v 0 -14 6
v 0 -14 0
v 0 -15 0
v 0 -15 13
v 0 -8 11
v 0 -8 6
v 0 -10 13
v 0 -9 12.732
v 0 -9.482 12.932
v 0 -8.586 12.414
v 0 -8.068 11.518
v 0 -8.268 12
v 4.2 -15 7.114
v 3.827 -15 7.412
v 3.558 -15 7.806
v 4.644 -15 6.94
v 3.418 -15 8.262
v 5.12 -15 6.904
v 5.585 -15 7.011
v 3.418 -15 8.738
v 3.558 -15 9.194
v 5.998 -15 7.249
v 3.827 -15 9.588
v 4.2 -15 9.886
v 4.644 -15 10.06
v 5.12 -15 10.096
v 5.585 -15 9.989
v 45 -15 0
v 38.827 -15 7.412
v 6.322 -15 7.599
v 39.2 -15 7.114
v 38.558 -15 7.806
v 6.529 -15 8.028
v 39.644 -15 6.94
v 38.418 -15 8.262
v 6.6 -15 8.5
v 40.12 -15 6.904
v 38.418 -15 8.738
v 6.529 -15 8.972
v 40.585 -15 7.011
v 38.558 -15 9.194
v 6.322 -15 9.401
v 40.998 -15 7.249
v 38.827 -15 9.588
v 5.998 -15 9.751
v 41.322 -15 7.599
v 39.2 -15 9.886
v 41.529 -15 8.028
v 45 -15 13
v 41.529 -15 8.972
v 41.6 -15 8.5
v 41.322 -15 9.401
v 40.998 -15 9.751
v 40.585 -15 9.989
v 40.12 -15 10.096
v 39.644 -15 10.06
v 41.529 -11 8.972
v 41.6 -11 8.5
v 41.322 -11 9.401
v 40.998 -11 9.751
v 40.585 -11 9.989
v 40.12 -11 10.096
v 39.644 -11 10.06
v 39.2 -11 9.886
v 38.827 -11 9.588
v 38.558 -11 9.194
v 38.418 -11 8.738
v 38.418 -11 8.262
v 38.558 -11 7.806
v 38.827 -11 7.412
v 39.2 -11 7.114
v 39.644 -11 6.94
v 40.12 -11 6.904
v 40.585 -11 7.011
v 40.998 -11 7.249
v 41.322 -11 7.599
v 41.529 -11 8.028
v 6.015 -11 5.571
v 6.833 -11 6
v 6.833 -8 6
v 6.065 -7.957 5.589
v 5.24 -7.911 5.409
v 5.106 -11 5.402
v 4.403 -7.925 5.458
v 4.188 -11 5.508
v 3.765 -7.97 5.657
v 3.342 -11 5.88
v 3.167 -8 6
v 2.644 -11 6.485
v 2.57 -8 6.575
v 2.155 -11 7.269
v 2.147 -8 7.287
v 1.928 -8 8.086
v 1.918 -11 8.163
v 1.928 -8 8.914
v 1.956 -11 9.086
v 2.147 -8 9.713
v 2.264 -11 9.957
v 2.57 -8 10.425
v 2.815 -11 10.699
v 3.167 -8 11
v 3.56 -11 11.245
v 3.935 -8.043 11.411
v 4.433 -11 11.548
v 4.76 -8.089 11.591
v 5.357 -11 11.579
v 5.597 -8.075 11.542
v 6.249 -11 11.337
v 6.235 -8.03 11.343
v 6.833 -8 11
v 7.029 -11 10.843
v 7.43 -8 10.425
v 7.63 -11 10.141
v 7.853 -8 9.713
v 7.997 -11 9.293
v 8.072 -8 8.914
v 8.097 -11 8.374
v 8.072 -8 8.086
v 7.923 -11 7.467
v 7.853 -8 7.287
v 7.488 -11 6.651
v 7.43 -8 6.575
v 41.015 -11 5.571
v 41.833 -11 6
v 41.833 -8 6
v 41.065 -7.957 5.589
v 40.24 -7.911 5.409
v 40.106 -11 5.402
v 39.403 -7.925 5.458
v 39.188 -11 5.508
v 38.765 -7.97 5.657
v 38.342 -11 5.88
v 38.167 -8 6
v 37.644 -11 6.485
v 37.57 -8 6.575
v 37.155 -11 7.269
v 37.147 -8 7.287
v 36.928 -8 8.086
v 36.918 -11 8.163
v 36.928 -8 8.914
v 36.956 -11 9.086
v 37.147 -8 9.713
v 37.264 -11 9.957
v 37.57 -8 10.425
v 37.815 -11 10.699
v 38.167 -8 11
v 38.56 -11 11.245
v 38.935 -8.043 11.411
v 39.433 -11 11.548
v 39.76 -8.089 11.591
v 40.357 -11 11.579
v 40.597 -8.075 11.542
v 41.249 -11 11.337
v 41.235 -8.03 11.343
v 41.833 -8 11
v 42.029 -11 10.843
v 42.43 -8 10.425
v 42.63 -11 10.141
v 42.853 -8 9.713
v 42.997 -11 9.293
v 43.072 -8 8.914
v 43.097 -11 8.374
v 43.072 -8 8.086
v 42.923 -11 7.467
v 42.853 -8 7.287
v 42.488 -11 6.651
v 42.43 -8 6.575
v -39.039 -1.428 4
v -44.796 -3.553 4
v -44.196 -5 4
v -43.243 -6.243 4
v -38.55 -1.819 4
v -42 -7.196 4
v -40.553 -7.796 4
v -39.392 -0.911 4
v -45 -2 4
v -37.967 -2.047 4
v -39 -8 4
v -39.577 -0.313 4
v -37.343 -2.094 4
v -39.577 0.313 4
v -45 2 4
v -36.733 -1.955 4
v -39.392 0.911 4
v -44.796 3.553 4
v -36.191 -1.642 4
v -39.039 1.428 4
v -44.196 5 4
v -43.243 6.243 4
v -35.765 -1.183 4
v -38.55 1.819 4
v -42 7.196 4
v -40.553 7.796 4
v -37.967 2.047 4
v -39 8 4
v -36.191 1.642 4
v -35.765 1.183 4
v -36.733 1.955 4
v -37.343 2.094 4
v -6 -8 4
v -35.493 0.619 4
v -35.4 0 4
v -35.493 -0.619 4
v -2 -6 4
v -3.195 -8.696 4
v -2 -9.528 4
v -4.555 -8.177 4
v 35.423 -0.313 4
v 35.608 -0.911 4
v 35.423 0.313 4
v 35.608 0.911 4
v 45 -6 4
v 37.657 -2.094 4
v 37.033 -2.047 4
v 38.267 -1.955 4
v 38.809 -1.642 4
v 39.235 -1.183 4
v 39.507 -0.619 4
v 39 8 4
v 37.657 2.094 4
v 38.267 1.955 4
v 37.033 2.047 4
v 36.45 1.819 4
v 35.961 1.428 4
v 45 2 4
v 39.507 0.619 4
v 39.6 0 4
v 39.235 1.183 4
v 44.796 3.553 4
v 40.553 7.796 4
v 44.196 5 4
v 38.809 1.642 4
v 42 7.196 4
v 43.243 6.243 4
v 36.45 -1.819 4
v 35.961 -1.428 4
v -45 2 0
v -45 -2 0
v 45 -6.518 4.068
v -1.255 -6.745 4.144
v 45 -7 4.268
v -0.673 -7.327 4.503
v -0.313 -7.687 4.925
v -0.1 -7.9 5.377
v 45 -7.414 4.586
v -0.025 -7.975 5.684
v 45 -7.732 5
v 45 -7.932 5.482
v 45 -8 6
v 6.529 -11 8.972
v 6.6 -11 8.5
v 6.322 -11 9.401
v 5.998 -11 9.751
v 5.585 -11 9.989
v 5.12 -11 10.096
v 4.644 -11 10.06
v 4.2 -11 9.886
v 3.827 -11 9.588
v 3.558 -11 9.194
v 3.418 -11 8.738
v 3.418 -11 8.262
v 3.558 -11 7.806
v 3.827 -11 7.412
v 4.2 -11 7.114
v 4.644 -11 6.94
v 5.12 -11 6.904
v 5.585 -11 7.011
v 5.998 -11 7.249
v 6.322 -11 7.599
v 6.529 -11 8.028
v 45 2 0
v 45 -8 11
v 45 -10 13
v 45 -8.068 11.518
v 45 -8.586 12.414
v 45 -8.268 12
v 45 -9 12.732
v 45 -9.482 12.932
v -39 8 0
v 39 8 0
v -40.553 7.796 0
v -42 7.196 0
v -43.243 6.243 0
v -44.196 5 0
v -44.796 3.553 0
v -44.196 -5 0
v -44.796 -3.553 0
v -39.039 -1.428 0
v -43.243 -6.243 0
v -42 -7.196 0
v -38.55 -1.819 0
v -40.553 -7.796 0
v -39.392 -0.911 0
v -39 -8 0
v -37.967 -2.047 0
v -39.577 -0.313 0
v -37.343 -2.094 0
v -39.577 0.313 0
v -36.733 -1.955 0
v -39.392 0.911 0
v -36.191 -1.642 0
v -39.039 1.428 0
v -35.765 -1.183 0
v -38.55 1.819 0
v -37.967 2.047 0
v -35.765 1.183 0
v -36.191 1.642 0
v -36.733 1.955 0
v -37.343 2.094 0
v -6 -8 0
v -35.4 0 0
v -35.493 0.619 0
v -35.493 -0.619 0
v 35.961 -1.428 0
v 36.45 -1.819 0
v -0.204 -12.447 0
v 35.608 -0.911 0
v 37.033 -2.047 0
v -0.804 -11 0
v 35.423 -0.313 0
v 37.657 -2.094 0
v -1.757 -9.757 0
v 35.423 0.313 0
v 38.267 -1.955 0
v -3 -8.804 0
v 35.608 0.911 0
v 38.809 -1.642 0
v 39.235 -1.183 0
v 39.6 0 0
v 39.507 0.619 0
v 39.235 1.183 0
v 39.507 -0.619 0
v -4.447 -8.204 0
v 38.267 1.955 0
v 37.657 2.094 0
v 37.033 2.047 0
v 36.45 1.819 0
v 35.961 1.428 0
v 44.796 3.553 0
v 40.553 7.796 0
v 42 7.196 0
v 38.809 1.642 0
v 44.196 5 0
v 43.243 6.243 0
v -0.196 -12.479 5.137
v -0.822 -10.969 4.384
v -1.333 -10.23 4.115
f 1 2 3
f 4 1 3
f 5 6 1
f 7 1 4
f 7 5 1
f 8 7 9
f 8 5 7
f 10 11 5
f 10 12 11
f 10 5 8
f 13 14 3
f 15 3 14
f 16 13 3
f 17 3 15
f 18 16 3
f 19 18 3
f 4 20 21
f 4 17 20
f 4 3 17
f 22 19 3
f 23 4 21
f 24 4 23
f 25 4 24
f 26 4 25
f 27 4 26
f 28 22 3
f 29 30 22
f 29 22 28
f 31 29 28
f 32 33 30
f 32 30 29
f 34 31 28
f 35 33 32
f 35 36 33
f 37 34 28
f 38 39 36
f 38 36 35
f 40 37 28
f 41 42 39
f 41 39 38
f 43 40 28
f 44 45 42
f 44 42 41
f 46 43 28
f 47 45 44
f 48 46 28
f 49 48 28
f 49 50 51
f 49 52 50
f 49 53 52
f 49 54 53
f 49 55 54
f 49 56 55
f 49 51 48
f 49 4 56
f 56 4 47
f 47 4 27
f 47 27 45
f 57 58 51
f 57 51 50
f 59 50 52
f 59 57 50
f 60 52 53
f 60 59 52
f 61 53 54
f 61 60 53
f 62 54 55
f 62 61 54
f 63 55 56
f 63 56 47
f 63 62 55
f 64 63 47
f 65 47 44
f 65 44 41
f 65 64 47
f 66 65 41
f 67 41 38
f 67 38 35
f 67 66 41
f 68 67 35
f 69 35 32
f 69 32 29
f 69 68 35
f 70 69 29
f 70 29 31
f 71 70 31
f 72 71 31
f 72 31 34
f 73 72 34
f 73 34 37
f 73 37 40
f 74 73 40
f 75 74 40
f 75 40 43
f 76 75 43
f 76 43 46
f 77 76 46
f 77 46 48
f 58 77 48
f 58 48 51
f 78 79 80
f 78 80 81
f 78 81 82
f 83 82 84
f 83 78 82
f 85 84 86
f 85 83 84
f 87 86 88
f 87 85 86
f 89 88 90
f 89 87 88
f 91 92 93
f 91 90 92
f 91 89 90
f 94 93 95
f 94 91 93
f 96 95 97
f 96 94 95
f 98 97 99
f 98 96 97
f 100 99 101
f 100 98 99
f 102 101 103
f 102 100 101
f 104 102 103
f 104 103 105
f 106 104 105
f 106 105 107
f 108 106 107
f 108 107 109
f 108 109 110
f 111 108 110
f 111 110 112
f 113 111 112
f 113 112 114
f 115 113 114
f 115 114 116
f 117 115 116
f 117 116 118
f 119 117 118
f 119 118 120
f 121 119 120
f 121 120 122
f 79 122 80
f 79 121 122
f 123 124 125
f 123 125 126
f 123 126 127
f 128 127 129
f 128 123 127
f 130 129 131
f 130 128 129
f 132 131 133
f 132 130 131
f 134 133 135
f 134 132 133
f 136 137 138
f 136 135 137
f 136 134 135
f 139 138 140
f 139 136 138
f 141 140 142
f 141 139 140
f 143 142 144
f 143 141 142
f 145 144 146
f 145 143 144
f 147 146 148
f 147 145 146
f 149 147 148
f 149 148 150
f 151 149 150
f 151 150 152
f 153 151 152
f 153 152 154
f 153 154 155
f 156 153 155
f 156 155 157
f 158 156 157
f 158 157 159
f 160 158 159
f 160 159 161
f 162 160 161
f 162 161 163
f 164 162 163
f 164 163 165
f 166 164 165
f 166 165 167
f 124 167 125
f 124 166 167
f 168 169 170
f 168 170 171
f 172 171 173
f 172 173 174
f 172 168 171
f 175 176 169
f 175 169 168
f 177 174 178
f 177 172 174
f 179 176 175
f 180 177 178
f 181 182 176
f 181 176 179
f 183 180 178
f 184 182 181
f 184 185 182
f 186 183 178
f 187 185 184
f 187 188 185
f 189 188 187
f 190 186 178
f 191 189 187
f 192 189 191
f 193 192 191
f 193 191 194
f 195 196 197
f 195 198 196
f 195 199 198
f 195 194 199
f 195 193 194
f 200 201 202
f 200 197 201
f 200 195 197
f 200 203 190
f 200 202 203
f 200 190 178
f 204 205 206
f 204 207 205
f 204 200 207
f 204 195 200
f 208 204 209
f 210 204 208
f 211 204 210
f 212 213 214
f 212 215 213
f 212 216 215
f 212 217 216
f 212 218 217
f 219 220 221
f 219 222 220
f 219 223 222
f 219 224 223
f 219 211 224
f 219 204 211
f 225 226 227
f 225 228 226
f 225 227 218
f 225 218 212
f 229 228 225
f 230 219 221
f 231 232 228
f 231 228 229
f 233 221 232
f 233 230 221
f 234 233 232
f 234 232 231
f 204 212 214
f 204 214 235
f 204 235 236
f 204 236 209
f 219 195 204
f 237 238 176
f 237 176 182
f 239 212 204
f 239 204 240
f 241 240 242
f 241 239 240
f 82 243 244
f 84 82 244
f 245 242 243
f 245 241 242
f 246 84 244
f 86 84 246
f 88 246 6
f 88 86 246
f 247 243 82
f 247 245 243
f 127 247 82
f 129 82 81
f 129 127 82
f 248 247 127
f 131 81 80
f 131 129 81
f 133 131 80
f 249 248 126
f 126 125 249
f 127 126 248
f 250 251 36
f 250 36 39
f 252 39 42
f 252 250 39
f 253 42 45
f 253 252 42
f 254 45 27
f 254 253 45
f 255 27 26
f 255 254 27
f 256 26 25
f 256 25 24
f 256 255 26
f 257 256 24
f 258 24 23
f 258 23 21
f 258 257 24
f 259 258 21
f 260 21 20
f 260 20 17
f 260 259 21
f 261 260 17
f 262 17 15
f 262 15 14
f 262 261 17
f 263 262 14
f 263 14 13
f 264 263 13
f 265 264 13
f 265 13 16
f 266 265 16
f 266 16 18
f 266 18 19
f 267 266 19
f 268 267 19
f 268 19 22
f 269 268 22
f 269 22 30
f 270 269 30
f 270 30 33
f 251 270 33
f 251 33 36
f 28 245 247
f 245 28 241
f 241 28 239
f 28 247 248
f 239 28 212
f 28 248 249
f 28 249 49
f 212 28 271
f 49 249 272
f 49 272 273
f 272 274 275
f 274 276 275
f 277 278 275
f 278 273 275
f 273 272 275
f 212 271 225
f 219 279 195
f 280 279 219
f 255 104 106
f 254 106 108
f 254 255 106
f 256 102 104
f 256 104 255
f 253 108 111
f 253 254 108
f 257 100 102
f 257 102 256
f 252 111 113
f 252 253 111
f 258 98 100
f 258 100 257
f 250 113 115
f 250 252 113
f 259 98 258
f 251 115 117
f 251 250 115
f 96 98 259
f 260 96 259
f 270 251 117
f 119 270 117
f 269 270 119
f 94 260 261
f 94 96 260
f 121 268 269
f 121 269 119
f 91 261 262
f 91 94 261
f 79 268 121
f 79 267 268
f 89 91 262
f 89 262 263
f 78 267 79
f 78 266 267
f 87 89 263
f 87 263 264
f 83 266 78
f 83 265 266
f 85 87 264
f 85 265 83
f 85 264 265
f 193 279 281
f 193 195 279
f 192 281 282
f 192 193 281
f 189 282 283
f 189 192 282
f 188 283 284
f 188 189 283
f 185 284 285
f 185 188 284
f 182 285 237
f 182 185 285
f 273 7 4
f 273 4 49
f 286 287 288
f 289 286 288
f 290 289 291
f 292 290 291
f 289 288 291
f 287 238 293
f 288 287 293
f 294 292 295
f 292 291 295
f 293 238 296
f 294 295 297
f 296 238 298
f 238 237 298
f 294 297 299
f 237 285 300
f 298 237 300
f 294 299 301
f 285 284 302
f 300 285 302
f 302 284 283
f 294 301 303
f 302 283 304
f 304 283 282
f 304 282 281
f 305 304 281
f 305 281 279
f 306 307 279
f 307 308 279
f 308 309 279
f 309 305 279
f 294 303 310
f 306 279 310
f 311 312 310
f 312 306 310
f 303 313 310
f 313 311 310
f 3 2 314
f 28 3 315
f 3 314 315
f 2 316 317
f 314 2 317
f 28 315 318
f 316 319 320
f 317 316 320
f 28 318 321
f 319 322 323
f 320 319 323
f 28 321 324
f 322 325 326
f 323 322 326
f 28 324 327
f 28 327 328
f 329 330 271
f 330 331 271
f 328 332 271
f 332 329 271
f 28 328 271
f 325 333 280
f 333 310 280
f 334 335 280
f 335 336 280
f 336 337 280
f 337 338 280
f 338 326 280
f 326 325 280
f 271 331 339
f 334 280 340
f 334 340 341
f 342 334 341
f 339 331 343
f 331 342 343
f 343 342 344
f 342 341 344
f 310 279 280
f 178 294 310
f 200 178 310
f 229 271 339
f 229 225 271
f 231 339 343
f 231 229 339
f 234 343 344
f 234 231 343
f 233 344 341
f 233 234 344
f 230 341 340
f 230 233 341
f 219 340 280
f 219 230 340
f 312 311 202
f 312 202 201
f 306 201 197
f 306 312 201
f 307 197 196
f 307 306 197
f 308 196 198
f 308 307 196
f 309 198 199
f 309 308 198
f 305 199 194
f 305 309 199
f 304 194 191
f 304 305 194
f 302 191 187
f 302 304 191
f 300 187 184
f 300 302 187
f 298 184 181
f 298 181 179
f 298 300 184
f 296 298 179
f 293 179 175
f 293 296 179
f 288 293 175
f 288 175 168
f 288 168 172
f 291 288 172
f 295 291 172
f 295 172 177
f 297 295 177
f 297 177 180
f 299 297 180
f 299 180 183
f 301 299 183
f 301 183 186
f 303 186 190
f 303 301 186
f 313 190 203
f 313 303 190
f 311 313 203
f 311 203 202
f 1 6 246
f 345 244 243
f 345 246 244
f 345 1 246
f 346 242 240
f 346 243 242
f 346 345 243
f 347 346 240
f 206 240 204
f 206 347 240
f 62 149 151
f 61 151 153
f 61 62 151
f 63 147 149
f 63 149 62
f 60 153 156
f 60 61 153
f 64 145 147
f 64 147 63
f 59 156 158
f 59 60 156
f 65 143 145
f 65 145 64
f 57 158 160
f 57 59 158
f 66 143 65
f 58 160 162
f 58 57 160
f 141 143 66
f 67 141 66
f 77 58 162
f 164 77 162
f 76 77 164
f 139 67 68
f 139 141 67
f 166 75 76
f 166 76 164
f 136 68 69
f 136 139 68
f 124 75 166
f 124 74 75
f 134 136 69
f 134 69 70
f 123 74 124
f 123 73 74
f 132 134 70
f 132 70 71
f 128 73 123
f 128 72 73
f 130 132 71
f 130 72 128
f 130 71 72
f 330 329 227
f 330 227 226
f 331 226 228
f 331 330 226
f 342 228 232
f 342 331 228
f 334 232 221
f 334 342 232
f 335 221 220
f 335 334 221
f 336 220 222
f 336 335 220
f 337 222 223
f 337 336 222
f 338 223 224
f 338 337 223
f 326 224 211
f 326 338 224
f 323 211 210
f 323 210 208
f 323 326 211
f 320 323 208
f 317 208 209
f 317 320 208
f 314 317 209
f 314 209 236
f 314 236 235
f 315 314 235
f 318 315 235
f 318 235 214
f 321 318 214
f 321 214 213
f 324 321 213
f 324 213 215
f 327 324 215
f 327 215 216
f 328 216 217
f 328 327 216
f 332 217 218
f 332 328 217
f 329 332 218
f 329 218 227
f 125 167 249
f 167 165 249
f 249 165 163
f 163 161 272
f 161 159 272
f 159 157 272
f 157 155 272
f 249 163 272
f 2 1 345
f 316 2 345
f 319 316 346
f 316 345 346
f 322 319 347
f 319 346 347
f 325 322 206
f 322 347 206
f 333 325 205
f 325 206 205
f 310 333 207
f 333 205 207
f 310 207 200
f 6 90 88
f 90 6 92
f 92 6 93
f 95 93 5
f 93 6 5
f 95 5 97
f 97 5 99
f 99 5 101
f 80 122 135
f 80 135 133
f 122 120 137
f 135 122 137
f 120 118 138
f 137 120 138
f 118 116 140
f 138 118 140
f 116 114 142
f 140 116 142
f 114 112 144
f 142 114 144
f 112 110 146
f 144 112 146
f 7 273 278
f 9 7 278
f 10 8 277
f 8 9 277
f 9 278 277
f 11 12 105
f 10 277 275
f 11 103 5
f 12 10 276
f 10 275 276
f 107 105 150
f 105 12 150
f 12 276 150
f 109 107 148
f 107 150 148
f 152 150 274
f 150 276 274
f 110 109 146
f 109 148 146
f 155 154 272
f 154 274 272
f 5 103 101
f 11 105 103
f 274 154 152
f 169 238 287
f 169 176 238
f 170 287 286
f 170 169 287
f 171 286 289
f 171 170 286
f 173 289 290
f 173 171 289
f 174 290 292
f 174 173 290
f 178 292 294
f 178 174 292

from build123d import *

# Parameters (mm, degrees)
ESBO_O1_W                  = 90
ESBO_O1_H                  = 16
ESBO_O1_R                  = 2.1
RESSALTO_EXTRUS_O1_DEPTH   = 4
ESBO_O2_W                  = 45
ESBO_O2_H                  = 13
ESBO_O2_R                  = 1.6
RESSALTO_EXTRUS_O3_DEPTH   = 7
FILETE1_R                  = 6
FILETE2_R                  = 2
CORTE_EXTRUS_O1_DEPTH      = 10
CORTE_EXTRUS_O1_DEPTH_BACK = 3
ESBO_O3_R                  = 3.1
FILETE3_R                  = 2


with BuildPart() as part:
    # Esboço1 → Ressalto-extrusão1 (new body)
    with BuildSketch(Plane.XY):
        Rectangle(ESBO_O1_W, ESBO_O1_H)
        with Locations((-37.5, 0)):
            Circle(ESBO_O1_R, mode=Mode.SUBTRACT)
        with Locations((37.5, 0)):
            Circle(ESBO_O1_R, mode=Mode.SUBTRACT)
    extrude(amount=RESSALTO_EXTRUS_O1_DEPTH)

    # Esboço2 → Ressalto-extrusão3 (add)
    with BuildSketch(Plane.XZ.offset(8)):
        with Locations((22.5, 6.5)):
            Rectangle(ESBO_O2_W, ESBO_O2_H)
        with Locations((40, 8.5)):
            Circle(ESBO_O2_R, mode=Mode.SUBTRACT)
        with Locations((5, 8.5)):
            Circle(ESBO_O2_R, mode=Mode.SUBTRACT)
    extrude(amount=RESSALTO_EXTRUS_O3_DEPTH)

    # Filete1
    filete1_edges = [part.edges().sort_by_distance(p)[0] for p in [
        (0, -8, 2),
        (-45, 8, 2),
        (45, 8, 2),
        (-45, -8, 2),
    ]]
    fillet(filete1_edges, radius=FILETE1_R)

    # Filete2
    filete2_edges = [part.edges().sort_by_distance(p)[0] for p in [
        (22.5, -8, 4),
        (0, -11, 4),
    ]]
    fillet(filete2_edges, radius=FILETE2_R)

    # Esboço3 → Corte-extrusão1 (cut, two sides: drawn at the far end of the back side and taken through both)
    with BuildSketch(Plane(origin=(0, -8, 0), x_dir=(1, 0, 0), z_dir=(0, 1, 0)).offset(-CORTE_EXTRUS_O1_DEPTH_BACK)):
        with Locations(Location((5, -8.5, 0), (0, 0, 53.750679117))):
            Circle(ESBO_O3_R)
        with Locations(Location((40, -8.5, 0), (0, 0, 53.750679117))):
            Circle(ESBO_O3_R)
    extrude(amount=CORTE_EXTRUS_O1_DEPTH + CORTE_EXTRUS_O1_DEPTH_BACK, mode=Mode.SUBTRACT)

    # Filete3
    # the kernel refuses this fillet: 2 mm, written as the material it takes off along each edge
    with BuildSketch(Plane(origin=(50, -8, 13), x_dir=(0, 0, -1), z_dir=(-1, 0, 0))) as filete3_piece_1:
        with BuildLine():
            CenterArc((FILETE3_R, FILETE3_R), FILETE3_R, 180, 90)
            Line((0, FILETE3_R), (0, 0))
            Line((0, 0), (FILETE3_R, 0))
        make_face()
    extrude(amount=55, mode=Mode.SUBTRACT)


solid = part.part
